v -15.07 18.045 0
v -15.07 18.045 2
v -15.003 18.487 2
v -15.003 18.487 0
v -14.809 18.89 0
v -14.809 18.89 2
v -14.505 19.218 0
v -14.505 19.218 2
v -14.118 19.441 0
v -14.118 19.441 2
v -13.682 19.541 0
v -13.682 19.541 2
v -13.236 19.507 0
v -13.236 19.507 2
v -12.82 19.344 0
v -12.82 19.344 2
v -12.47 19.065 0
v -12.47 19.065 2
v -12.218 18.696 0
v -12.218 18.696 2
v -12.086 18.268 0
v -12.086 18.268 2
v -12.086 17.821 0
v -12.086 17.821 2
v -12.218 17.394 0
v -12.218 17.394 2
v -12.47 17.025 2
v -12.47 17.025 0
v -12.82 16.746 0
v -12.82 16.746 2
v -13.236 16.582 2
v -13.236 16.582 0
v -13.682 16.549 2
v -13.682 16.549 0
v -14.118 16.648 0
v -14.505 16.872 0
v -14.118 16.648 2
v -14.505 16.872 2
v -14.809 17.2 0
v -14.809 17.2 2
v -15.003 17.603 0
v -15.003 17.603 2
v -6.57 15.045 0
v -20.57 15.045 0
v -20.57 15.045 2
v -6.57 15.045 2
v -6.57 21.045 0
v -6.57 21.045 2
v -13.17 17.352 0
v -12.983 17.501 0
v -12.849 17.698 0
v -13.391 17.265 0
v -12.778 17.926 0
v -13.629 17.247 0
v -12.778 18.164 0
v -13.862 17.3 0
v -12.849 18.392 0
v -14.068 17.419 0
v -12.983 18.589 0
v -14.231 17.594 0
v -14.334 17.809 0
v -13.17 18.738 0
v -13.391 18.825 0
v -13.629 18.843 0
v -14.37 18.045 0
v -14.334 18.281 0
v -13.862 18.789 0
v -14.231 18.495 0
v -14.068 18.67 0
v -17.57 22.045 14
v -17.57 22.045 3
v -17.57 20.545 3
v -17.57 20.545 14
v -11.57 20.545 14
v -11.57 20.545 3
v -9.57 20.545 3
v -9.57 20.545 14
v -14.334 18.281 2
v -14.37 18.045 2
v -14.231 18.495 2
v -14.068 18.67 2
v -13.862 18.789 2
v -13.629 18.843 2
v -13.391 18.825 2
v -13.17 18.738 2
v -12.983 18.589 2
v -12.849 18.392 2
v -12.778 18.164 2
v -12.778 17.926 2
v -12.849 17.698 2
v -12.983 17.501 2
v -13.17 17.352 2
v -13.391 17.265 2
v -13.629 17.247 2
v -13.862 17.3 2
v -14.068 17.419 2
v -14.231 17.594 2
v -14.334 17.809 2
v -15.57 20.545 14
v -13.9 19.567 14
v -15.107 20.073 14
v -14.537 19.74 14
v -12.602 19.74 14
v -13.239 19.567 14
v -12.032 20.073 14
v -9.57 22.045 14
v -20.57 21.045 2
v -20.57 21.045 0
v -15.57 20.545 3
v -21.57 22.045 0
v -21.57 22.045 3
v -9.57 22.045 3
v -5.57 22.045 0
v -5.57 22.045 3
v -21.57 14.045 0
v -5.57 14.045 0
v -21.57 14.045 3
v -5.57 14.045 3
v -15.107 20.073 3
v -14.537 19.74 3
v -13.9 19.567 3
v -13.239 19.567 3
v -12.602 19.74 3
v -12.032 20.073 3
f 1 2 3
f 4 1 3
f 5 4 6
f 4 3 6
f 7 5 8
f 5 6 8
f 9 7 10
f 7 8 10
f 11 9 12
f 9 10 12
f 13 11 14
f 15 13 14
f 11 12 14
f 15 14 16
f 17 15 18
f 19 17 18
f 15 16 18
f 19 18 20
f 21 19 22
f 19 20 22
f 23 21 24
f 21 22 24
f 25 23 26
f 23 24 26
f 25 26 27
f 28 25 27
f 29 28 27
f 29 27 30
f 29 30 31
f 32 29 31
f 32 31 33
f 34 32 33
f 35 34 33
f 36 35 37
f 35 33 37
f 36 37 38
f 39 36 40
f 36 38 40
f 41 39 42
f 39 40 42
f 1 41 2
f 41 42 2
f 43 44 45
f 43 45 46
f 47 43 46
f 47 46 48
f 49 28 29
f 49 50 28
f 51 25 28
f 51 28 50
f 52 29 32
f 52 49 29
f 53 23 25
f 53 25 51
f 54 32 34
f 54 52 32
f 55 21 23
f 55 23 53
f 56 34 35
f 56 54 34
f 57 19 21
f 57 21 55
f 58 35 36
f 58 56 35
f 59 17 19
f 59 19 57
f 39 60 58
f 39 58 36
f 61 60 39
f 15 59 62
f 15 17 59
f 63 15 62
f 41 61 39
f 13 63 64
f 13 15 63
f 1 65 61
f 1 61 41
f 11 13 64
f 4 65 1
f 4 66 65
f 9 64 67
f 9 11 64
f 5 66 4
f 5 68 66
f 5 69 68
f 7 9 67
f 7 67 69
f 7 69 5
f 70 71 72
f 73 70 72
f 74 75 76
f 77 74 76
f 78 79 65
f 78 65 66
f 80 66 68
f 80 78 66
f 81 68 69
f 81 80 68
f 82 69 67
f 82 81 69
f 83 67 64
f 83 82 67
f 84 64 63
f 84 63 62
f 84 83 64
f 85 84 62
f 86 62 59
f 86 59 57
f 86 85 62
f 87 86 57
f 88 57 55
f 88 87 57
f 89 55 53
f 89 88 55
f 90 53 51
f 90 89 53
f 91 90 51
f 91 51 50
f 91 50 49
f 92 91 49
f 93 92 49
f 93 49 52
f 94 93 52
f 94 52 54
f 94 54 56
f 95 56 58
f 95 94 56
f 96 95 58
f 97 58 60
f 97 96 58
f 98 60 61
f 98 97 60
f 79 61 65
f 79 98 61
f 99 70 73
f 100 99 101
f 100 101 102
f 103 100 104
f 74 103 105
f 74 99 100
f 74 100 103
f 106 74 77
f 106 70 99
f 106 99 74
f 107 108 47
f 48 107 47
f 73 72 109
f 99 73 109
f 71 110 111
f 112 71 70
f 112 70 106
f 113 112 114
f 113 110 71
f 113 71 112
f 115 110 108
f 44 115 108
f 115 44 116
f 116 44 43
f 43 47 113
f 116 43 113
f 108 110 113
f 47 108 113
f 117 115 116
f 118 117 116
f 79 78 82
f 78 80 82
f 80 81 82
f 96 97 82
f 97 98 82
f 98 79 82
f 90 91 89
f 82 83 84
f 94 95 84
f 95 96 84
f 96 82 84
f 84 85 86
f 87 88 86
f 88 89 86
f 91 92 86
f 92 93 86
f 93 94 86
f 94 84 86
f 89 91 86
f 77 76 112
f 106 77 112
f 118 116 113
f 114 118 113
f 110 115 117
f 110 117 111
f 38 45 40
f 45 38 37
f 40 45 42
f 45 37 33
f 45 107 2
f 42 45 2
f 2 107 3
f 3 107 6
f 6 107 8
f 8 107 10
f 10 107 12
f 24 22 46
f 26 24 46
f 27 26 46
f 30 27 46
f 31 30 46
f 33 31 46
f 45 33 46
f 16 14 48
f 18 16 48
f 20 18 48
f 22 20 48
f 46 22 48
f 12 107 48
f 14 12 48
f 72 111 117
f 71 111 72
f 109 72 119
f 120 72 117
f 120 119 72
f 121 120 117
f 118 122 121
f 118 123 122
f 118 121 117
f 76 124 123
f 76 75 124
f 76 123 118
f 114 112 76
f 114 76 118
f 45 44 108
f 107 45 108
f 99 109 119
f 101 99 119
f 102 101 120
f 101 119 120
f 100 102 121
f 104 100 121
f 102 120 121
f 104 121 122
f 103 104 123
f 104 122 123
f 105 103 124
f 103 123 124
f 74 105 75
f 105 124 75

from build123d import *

# Parameters (mm, degrees)
SKETCH1_W           = 16
SKETCH1_H           = 8
BOSS_EXTRUDE1_DEPTH = 3
SHELL3_T            = -1
SKETCH2_R           = 1.5
SKETCH2_R_2         = 0.8
BOSS_EXTRUDE2_DEPTH = 2
BOSS_EXTRUDE3_DEPTH = 11


with BuildPart() as part:
    # Sketch1 → Boss-Extrude1 (new body)
    with BuildSketch(Plane.XY):
        with Locations((-13.569515058, 18.04477027)):
            Rectangle(SKETCH1_W, SKETCH1_H)
    extrude(amount=BOSS_EXTRUDE1_DEPTH)

    # Shell3
    shell3_openings = [part.faces().sort_by_distance(p)[0] for p in [
        (-13.569515058, 18.04477027, 0),
    ]]
    offset(amount=SHELL3_T, openings=shell3_openings, kind=Kind.INTERSECTION)

    # Sketch2 → Boss-Extrude2 (add)
    with BuildSketch(Plane(origin=(0, 0, 2), x_dir=(-1, 0, 0), z_dir=(0, 0, -1))):
        with Locations((13.569515058, 18.04477027)):
            Circle(SKETCH2_R)
        with Locations((13.569515058, 18.04477027)):
            Circle(SKETCH2_R_2, mode=Mode.SUBTRACT)
    extrude(amount=BOSS_EXTRUDE2_DEPTH)

    # Sketch3 → Boss-Extrude3 (add)
    with BuildSketch(Plane.XY.offset(3)):
        with BuildLine():
            Line((-17.569515058, 22.04477027), (-17.569515058, 20.54477027))
            Line((-17.569515058, 20.54477027), (-15.569515058, 20.54477027))
            ThreePointArc((-15.569515058, 20.54477027), (-13.569515058, 19.54477027), (-11.569515058, 20.54477027))
            Line((-11.569515058, 20.54477027), (-9.569515058, 20.54477027))
            Line((-9.569515058, 20.54477027), (-9.569515058, 22.04477027))
            Line((-9.569515058, 22.04477027), (-17.569515058, 22.04477027))
        make_face()
    extrude(amount=BOSS_EXTRUDE3_DEPTH)


solid = part.part
